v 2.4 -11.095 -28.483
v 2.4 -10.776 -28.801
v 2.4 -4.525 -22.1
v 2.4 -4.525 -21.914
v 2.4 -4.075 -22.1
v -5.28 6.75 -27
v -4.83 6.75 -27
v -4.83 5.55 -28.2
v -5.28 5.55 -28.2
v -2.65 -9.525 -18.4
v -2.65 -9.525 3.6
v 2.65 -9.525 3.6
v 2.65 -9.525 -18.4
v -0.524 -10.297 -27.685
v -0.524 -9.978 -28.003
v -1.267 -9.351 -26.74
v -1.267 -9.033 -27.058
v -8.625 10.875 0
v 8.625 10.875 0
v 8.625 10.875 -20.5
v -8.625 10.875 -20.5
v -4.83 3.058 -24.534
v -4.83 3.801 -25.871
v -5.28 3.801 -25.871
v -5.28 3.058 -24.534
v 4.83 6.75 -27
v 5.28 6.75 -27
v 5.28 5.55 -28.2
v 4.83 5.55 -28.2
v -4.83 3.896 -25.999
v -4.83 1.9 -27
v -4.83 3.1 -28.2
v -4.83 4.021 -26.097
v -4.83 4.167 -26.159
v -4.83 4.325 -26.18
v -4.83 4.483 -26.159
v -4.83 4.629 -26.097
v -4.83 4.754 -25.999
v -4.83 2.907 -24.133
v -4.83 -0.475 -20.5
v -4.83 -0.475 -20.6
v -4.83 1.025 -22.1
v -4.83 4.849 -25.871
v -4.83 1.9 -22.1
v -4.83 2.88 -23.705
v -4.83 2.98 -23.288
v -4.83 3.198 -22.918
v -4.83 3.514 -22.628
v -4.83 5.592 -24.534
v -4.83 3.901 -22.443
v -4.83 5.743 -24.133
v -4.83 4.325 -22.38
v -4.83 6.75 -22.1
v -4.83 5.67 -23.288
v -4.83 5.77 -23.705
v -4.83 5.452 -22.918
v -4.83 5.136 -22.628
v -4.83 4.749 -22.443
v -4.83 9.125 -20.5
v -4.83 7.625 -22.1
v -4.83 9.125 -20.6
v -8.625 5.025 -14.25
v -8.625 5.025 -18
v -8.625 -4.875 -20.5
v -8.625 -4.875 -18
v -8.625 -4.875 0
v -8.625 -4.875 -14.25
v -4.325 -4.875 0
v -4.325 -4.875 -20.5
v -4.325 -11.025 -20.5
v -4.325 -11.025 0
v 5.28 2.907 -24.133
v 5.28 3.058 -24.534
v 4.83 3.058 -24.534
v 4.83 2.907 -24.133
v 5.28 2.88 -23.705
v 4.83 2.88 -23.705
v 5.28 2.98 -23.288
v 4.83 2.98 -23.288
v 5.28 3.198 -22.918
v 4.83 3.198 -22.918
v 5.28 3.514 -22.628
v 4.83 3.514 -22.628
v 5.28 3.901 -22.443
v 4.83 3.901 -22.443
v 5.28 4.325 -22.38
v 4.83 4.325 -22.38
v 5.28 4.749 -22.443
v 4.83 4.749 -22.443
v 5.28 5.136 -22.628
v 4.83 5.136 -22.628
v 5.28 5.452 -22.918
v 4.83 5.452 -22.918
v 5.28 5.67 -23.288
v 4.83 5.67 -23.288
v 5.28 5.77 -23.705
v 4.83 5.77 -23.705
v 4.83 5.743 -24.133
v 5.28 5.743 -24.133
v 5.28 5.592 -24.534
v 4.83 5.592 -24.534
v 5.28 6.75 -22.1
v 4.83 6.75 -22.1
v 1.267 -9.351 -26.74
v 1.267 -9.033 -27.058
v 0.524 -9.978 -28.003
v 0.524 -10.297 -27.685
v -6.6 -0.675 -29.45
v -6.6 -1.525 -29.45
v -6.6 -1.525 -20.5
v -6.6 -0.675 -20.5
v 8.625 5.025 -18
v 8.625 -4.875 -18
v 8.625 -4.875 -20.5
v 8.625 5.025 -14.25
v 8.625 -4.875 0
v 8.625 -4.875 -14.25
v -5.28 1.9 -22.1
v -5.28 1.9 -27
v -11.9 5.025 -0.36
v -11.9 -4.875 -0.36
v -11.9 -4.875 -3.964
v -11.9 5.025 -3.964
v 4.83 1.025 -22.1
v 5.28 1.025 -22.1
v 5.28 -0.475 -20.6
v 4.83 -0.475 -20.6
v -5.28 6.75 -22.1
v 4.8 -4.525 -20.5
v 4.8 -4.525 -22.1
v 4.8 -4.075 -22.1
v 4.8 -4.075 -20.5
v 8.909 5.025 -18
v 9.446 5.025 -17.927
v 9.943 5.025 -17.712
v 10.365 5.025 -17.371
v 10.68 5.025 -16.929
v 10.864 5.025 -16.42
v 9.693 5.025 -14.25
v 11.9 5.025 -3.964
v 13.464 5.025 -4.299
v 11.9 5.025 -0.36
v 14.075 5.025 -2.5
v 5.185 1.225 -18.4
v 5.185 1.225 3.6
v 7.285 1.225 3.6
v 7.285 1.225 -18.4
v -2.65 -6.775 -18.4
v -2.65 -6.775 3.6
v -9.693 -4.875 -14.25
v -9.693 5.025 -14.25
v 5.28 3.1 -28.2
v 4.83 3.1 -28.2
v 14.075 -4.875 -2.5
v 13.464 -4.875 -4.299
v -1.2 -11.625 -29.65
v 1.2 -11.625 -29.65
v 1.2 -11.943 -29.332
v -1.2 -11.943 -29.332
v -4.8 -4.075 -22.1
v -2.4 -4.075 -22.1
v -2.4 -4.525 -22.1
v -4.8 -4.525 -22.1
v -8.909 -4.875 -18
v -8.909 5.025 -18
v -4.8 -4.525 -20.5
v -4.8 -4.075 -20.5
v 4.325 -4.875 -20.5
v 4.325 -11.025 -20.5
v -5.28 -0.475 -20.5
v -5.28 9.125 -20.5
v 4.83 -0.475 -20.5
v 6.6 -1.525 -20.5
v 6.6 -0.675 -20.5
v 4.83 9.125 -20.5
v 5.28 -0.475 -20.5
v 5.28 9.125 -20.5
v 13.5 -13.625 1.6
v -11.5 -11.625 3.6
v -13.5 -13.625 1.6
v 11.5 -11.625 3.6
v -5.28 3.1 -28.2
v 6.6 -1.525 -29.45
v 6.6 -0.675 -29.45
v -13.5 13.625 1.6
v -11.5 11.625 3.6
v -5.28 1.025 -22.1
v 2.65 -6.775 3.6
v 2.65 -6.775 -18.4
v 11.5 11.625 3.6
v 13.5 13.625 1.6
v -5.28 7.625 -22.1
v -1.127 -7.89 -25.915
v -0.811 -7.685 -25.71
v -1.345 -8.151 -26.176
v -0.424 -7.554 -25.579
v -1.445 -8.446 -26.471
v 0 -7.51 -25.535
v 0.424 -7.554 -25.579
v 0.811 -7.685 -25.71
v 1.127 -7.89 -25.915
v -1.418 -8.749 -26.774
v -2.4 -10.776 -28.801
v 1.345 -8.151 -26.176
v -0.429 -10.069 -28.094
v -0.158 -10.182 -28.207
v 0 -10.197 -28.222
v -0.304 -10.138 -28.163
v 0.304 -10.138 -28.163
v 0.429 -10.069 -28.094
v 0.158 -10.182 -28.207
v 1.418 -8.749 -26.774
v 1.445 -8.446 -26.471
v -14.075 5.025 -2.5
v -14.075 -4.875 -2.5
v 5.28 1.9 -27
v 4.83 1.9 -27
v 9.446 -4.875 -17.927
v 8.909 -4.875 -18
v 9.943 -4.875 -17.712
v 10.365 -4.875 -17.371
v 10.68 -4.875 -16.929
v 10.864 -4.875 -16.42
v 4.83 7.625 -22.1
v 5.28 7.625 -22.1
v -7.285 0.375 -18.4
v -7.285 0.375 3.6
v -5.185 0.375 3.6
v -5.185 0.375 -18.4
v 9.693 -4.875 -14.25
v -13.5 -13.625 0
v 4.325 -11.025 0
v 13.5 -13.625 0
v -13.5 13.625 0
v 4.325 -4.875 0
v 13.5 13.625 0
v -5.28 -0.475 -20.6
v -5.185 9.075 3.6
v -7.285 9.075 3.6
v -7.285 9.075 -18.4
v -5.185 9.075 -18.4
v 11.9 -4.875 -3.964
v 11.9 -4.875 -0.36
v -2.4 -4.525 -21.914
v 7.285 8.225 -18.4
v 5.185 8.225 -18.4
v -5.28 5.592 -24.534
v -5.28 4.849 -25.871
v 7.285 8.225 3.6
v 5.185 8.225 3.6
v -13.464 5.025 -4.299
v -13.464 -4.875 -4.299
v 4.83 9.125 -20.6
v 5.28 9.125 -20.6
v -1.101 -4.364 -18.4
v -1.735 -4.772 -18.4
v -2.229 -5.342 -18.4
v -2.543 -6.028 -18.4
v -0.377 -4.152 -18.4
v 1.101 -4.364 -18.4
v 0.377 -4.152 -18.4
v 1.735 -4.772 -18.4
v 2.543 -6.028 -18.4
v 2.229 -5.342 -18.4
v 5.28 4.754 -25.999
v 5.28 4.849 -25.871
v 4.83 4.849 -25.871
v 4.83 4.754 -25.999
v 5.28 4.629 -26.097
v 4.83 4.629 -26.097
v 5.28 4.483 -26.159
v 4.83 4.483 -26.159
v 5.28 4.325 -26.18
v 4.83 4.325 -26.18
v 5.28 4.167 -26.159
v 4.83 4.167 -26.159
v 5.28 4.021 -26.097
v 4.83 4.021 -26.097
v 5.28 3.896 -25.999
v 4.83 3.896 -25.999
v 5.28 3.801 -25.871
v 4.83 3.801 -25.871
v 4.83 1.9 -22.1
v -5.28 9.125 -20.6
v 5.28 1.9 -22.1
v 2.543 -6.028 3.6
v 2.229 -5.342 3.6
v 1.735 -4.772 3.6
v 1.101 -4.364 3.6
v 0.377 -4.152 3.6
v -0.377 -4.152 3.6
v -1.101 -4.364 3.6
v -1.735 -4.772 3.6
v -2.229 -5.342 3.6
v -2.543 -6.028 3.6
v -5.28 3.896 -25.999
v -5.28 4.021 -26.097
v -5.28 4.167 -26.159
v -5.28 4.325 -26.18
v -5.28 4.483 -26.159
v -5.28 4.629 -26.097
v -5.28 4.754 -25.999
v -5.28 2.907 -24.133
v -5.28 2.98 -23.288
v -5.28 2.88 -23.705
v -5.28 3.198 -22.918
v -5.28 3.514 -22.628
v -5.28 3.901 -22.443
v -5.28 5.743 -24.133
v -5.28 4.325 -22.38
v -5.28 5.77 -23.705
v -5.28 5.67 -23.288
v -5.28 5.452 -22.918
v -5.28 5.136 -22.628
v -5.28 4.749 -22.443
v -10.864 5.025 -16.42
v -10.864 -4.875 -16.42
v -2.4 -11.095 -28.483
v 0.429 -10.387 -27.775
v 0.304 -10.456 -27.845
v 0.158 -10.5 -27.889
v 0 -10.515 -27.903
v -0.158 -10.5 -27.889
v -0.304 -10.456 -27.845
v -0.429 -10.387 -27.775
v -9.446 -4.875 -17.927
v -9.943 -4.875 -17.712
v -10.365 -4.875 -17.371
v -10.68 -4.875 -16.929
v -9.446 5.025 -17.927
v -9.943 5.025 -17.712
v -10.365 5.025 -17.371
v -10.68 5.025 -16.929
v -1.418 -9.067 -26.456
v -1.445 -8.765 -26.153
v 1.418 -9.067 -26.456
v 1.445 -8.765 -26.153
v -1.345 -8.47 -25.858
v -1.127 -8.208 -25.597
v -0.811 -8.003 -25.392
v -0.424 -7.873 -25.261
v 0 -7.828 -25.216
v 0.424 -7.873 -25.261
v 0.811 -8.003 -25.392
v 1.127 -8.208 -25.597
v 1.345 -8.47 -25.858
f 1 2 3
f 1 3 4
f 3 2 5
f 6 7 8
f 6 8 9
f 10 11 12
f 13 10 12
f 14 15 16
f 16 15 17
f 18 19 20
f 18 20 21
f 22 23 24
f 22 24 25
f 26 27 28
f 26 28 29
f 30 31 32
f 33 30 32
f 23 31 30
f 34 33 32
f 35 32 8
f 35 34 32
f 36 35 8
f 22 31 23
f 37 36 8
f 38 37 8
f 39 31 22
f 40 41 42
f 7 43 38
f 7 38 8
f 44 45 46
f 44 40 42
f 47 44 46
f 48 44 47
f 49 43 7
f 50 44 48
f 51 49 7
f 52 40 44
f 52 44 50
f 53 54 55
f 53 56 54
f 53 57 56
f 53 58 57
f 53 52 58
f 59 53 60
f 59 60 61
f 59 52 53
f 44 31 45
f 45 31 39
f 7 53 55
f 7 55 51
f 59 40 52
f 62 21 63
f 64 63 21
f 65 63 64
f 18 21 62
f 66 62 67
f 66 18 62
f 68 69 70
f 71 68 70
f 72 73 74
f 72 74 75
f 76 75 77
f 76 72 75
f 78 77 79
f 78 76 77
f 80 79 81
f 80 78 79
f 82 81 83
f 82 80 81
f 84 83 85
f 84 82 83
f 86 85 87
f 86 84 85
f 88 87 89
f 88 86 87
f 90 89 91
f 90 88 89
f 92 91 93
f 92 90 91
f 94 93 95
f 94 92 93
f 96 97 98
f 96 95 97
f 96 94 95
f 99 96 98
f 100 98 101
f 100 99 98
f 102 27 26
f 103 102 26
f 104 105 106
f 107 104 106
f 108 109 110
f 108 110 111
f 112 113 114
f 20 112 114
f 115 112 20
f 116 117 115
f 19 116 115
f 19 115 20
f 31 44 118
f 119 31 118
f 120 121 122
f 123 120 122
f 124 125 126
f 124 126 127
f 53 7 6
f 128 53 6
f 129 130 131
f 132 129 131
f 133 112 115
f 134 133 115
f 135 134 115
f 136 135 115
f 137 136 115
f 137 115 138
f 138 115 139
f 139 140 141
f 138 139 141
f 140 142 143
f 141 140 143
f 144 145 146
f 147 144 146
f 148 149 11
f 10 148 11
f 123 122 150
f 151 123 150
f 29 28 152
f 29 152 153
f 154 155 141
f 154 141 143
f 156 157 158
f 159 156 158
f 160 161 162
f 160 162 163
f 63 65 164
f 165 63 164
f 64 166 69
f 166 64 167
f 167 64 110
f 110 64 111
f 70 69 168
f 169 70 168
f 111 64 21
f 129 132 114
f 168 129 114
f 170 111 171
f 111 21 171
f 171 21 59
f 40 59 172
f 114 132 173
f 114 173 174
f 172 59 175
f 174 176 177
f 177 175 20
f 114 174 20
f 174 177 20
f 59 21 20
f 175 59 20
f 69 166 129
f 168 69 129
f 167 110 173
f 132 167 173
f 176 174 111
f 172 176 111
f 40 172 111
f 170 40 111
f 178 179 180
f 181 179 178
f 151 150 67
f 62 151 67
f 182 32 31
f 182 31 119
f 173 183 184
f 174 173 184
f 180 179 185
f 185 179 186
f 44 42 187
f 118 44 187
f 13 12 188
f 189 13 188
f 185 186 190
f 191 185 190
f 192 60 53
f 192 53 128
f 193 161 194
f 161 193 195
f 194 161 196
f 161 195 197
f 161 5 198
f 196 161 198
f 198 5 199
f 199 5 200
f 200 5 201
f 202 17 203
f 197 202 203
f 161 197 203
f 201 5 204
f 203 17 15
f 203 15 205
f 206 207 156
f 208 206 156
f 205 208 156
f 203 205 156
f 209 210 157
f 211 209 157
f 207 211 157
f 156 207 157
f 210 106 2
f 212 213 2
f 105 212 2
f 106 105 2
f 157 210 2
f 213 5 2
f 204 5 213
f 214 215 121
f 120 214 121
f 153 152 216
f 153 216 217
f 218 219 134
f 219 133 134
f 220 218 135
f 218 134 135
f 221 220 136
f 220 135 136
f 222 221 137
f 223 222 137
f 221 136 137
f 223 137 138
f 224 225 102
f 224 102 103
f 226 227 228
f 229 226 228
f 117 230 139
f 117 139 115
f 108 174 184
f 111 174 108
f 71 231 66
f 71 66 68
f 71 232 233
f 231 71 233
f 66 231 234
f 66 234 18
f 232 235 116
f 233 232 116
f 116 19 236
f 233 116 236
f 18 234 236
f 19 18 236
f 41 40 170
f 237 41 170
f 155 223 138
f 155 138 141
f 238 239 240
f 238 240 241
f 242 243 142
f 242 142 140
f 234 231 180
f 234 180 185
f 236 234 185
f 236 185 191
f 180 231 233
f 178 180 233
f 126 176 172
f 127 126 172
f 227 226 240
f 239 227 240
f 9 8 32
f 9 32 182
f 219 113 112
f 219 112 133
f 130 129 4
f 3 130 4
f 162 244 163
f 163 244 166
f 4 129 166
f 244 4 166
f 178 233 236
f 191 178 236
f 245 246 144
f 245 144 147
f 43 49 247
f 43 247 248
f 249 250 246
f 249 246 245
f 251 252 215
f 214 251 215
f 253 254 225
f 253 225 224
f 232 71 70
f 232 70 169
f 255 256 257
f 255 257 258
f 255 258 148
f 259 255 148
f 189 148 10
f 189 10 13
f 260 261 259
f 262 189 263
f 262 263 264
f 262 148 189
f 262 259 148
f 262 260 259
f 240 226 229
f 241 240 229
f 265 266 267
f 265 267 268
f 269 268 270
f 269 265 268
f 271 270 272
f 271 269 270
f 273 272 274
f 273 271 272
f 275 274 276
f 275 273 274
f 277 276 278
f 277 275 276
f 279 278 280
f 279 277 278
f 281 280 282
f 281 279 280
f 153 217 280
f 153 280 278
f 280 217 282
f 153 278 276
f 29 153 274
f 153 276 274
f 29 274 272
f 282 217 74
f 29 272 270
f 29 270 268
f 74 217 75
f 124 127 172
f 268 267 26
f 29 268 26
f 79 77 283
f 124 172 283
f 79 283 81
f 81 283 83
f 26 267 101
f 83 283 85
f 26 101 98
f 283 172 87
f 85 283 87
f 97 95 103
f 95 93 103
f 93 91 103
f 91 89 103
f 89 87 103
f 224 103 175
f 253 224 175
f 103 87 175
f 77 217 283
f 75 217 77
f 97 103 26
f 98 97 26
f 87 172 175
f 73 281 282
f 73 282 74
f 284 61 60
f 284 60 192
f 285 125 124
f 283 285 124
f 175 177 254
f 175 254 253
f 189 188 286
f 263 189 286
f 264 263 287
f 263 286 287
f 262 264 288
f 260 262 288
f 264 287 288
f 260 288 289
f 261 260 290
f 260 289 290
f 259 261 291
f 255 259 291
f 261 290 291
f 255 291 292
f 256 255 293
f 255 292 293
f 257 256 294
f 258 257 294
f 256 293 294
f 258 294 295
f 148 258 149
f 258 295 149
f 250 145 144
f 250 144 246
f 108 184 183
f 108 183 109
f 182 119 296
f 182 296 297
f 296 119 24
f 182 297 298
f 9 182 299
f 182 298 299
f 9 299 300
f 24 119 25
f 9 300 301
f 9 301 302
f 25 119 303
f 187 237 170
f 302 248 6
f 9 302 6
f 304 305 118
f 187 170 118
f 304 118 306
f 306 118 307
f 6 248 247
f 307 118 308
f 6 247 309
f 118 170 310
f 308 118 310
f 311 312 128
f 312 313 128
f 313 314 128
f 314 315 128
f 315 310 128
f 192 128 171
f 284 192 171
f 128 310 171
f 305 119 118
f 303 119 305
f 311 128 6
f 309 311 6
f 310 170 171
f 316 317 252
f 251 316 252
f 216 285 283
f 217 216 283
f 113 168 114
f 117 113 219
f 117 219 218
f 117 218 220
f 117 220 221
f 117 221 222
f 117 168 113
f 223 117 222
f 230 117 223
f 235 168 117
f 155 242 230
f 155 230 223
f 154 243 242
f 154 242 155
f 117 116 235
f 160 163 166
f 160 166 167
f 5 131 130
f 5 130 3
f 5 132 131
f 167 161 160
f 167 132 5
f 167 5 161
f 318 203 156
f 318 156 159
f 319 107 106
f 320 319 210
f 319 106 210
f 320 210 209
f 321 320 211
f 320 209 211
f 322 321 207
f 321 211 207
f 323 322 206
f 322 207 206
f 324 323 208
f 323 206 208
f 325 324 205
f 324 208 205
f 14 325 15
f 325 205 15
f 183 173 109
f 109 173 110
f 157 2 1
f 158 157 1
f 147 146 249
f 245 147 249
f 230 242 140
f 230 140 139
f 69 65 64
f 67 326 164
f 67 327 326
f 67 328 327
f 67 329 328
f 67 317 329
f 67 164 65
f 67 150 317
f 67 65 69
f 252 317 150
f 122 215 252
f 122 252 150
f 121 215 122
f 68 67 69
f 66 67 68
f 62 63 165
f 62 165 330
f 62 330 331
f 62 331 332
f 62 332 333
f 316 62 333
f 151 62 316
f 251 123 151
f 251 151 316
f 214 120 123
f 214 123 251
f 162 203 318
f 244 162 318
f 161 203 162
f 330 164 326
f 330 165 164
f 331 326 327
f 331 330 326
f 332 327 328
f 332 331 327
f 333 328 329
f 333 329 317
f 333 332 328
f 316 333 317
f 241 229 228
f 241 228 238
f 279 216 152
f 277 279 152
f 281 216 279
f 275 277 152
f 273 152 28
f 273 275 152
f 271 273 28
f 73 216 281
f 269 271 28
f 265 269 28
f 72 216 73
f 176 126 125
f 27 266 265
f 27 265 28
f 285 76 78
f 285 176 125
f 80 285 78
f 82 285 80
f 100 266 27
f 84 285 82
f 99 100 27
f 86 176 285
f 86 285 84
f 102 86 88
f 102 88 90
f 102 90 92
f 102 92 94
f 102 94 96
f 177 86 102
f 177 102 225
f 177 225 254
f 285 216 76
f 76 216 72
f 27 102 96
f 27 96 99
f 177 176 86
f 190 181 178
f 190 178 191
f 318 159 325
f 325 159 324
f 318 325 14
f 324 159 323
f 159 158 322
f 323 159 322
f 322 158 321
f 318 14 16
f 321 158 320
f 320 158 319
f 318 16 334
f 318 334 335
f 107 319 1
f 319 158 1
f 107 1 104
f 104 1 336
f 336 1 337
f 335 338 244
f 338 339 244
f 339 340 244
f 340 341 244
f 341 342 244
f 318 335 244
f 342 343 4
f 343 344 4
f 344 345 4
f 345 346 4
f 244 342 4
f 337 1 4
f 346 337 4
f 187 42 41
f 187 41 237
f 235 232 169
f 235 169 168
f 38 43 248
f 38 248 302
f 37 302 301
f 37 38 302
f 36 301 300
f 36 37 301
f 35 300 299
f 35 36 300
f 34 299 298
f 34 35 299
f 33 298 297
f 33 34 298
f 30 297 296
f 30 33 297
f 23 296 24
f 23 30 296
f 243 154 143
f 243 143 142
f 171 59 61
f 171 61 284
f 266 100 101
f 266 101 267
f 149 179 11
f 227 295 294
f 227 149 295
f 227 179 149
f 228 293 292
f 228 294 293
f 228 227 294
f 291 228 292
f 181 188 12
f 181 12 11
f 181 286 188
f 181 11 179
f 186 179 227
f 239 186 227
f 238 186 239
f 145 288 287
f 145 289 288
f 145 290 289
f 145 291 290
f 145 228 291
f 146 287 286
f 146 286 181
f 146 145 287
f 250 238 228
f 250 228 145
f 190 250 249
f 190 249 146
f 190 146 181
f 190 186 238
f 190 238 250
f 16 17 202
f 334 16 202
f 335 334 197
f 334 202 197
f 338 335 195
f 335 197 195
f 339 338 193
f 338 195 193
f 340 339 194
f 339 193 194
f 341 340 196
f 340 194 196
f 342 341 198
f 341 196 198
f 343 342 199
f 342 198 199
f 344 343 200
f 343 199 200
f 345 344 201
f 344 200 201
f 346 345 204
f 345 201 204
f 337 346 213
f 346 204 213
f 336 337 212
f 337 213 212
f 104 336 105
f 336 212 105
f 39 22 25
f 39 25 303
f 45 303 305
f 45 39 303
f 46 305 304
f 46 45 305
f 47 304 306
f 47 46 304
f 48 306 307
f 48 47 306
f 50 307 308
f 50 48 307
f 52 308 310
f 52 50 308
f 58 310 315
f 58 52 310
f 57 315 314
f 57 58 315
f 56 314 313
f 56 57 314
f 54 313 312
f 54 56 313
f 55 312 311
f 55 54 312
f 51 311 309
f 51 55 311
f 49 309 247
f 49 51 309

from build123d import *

# Parameters (mm, degrees)
SKETCH1_W           = 27
SKETCH1_H           = 27.25
BOSS_EXTRUDE1_DEPTH = 3.6
CHAMFER1_SIZE       = 2
BOSS_EXTRUDE2_DEPTH = 20.5
CUT_EXTRUDE1_START  = 3.6
SKETCH1_3_W         = 2.1
SKETCH1_3_H         = 8.7
SKETCH1_3_H_2       = 7
CUT_EXTRUDE1_DEPTH  = 22
SKETCH3_W           = 0.45
SKETCH3_H           = 9.6
SKETCH3_W_2         = 9.6
SKETCH3_H_2         = 0.45
BOSS_EXTRUDE3_DEPTH = 1.6
CHAMFER2_SIZE       = 1.5
SKETCH4_W           = 0.45
SKETCH4_H           = 4.85
BOSS_EXTRUDE4_DEPTH = 6.1
BOSS_EXTRUDE5_DEPTH = 2.4
SKETCH6_W           = 13.2
SKETCH6_H           = 0.85
BOSS_EXTRUDE6_DEPTH = 8.95
CHAMFER3_SIZE       = 1.2
CUT_EXTRUDE2_DEPTH  = 38.649057425
CUT_EXTRUDE3_REACH  = 35.476
BOSS_EXTRUDE7_DEPTH = 9.9
FILLET1_R           = 2


with BuildPart() as part:
    # Sketch1 → Boss-Extrude1 (new body)
    with BuildSketch(Plane.XY):
        Rectangle(SKETCH1_W, SKETCH1_H)
    extrude(amount=BOSS_EXTRUDE1_DEPTH)

    # Chamfer1
    chamfer1_edges = [part.edges().sort_by_distance(p)[0] for p in [
        (13.5, 0, 3.6),
        (0, -13.625, 3.6),
        (-13.5, 0, 3.6),
        (0, 13.625, 3.6),
    ]]
    chamfer(chamfer1_edges, length=CHAMFER1_SIZE)

    # Sketch2 → Boss-Extrude2 (add)
    with BuildSketch(Plane(origin=(0, 0, 0), x_dir=(-1, 0, 0), z_dir=(0, 0, -1))):
        Polygon((-8.625, 10.875), (8.625, 10.875), (8.625, -4.875), (4.325, -4.875), (4.325, -11.025), (-4.325, -11.025), (-4.325, -4.875), (-8.625, -4.875), align=None)
    extrude(amount=BOSS_EXTRUDE2_DEPTH)

    # Sketch1<3> → Cut-Extrude1 (cut)
    with BuildSketch(Plane.XY.offset(CUT_EXTRUDE1_START)):
        with Locations((-6.235, 4.725)):
            Rectangle(SKETCH1_3_W, SKETCH1_3_H)
        with Locations((6.235, 4.725)):
            Rectangle(SKETCH1_3_W, SKETCH1_3_H_2)
        with BuildLine():
            Line((2.65, -9.525), (2.65, -6.775))
            ThreePointArc((2.65, -6.775), (0, -4.125), (-2.65, -6.775))
            Line((-2.65, -6.775), (-2.65, -9.525))
            Line((-2.65, -9.525), (2.65, -9.525))
        make_face()
    extrude(amount=-CUT_EXTRUDE1_DEPTH, mode=Mode.SUBTRACT)

    # Sketch3 → Boss-Extrude3 (add)
    with BuildSketch(Plane(origin=(0, 0, -20.5), x_dir=(-1, 0, 0), z_dir=(0, 0, -1))):
        with Locations((-5.055, 4.325)):
            Rectangle(SKETCH3_W, SKETCH3_H)
        with Locations((5.055, 4.325)):
            Rectangle(SKETCH3_W, SKETCH3_H)
        with Locations((0, -4.3)):
            Rectangle(SKETCH3_W_2, SKETCH3_H_2)
    extrude(amount=BOSS_EXTRUDE3_DEPTH)

    # Chamfer2
    chamfer2_edges = [part.edges().sort_by_distance(p)[0] for p in [
        (-5.055, 9.125, -22.1),
        (5.055, 9.125, -22.1),
        (5.055, -0.475, -22.1),
        (-5.055, -0.475, -22.1),
    ]]
    chamfer(chamfer2_edges, length=CHAMFER2_SIZE)

    # Sketch4 → Boss-Extrude4 (add)
    with BuildSketch(Plane(origin=(0, 0, -22.1), x_dir=(-1, 0, 0), z_dir=(0, 0, -1))):
        with Locations((-5.055, 4.325)):
            Rectangle(SKETCH4_W, SKETCH4_H)
        with Locations((5.055, 4.325)):
            Rectangle(SKETCH4_W, SKETCH4_H)
    extrude(amount=BOSS_EXTRUDE4_DEPTH)

    # Sketch5 → Boss-Extrude5 (add, symmetric)
    with BuildSketch(Plane(origin=(0, 0, 0), x_dir=(0, 0, -1), z_dir=(1, 0, 0))):
        Polygon((22.1, -4.075), (29.65, -11.625), (29.331801948, -11.943198052), (21.913603897, -4.525), (22.1, -4.525), align=None)
    extrude(amount=BOSS_EXTRUDE5_DEPTH, both=True)

    # Sketch6 → Boss-Extrude6 (add)
    with BuildSketch(Plane(origin=(0, 0, -20.5), x_dir=(-1, 0, 0), z_dir=(0, 0, -1))):
        with Locations((0, -1.1)):
            Rectangle(SKETCH6_W, SKETCH6_H)
    extrude(amount=BOSS_EXTRUDE6_DEPTH)

    # Chamfer3
    chamfer3_edges = [part.edges().sort_by_distance(p)[0] for p in [
        (5.055, 6.75, -28.2),
        (5.055, 1.9, -28.2),
        (-5.055, 6.75, -28.2),
        (-5.055, 1.9, -28.2),
        (-2.4, -11.784099026, -29.490900974),
        (2.4, -11.784099026, -29.490900974),
    ]]
    chamfer(chamfer3_edges, length=CHAMFER3_SIZE)

    # Sketch7 → Cut-Extrude2 (cut, through all)
    with BuildSketch(Plane(origin=(5.28, 0, 0), x_dir=(0, 0, -1), z_dir=(1, 0, 0))):
        with BuildLine():
            Line((24.534285714, 5.592470565), (25.871428571, 4.849470579))
            ThreePointArc((25.871428571, 4.849470579), (26.18, 4.325), (25.871428571, 3.800529421))
            Line((25.871428571, 3.800529421), (24.534285714, 3.057529435))
            ThreePointArc((24.534285714, 3.057529435), (22.38, 4.325), (24.534285714, 5.592470565))
        make_face()
    extrude(amount=-CUT_EXTRUDE2_DEPTH, mode=Mode.SUBTRACT)

    # Sketch8 → Cut-Extrude3 (cut, up to next)
    with BuildSketch(Plane(origin=(0, 9.0125, -9.0125), x_dir=(1, 0, 0), z_dir=(0, 0.7071067811865465, -0.7071067811865487)), mode=Mode.PRIVATE) as cut_extrude3_sk1:
        with BuildLine():
            Line((-0.524470579, 26.857260965), (-1.267470565, 25.520118108))
            ThreePointArc((-1.267470565, 25.520118108), (0, 23.365832393), (1.267470565, 25.520118108))
            Line((1.267470565, 25.520118108), (0.524470579, 26.857260965))
            ThreePointArc((0.524470579, 26.857260965), (0, 27.165832393), (-0.524470579, 26.857260965))
        make_face()
    cut_extrude3_tool1 = extrude(cut_extrude3_sk1.sketch, amount=-CUT_EXTRUDE3_REACH, mode=Mode.PRIVATE) & part.part
    add(cut_extrude3_tool1.solids().sort_by_distance((0, -8.733008, -26.758008))[0], mode=Mode.SUBTRACT)

    # Sketch9 → Boss-Extrude7 (add)
    with BuildSketch(Plane.XZ.offset(4.875)):
        Polygon((-8.625, -18), (-10.525, -18), (-13.4644015, -4.29921357), (-14.075, -2.5), (-11.9, -0.36), (-11.9, -3.963582901), (-9.693125963, -14.25), (-8.625, -14.25), align=None)
    boss_extrude7 = extrude(amount=-BOSS_EXTRUDE7_DEPTH)

    # Mirror1: Boss-Extrude7 across plane
    add(boss_extrude7.mirror(Plane(origin=(0, 0, 0), x_dir=(0, 0, 1), z_dir=(1, 0, 0))))

    # Fillet1
    fillet1_edges = [part.edges().sort_by_distance(p)[0] for p in [
        (-10.525, 0.075, -18),
        (10.525, 0.075, -18),
    ]]
    fillet(fillet1_edges, radius=FILLET1_R)


solid = part.part
